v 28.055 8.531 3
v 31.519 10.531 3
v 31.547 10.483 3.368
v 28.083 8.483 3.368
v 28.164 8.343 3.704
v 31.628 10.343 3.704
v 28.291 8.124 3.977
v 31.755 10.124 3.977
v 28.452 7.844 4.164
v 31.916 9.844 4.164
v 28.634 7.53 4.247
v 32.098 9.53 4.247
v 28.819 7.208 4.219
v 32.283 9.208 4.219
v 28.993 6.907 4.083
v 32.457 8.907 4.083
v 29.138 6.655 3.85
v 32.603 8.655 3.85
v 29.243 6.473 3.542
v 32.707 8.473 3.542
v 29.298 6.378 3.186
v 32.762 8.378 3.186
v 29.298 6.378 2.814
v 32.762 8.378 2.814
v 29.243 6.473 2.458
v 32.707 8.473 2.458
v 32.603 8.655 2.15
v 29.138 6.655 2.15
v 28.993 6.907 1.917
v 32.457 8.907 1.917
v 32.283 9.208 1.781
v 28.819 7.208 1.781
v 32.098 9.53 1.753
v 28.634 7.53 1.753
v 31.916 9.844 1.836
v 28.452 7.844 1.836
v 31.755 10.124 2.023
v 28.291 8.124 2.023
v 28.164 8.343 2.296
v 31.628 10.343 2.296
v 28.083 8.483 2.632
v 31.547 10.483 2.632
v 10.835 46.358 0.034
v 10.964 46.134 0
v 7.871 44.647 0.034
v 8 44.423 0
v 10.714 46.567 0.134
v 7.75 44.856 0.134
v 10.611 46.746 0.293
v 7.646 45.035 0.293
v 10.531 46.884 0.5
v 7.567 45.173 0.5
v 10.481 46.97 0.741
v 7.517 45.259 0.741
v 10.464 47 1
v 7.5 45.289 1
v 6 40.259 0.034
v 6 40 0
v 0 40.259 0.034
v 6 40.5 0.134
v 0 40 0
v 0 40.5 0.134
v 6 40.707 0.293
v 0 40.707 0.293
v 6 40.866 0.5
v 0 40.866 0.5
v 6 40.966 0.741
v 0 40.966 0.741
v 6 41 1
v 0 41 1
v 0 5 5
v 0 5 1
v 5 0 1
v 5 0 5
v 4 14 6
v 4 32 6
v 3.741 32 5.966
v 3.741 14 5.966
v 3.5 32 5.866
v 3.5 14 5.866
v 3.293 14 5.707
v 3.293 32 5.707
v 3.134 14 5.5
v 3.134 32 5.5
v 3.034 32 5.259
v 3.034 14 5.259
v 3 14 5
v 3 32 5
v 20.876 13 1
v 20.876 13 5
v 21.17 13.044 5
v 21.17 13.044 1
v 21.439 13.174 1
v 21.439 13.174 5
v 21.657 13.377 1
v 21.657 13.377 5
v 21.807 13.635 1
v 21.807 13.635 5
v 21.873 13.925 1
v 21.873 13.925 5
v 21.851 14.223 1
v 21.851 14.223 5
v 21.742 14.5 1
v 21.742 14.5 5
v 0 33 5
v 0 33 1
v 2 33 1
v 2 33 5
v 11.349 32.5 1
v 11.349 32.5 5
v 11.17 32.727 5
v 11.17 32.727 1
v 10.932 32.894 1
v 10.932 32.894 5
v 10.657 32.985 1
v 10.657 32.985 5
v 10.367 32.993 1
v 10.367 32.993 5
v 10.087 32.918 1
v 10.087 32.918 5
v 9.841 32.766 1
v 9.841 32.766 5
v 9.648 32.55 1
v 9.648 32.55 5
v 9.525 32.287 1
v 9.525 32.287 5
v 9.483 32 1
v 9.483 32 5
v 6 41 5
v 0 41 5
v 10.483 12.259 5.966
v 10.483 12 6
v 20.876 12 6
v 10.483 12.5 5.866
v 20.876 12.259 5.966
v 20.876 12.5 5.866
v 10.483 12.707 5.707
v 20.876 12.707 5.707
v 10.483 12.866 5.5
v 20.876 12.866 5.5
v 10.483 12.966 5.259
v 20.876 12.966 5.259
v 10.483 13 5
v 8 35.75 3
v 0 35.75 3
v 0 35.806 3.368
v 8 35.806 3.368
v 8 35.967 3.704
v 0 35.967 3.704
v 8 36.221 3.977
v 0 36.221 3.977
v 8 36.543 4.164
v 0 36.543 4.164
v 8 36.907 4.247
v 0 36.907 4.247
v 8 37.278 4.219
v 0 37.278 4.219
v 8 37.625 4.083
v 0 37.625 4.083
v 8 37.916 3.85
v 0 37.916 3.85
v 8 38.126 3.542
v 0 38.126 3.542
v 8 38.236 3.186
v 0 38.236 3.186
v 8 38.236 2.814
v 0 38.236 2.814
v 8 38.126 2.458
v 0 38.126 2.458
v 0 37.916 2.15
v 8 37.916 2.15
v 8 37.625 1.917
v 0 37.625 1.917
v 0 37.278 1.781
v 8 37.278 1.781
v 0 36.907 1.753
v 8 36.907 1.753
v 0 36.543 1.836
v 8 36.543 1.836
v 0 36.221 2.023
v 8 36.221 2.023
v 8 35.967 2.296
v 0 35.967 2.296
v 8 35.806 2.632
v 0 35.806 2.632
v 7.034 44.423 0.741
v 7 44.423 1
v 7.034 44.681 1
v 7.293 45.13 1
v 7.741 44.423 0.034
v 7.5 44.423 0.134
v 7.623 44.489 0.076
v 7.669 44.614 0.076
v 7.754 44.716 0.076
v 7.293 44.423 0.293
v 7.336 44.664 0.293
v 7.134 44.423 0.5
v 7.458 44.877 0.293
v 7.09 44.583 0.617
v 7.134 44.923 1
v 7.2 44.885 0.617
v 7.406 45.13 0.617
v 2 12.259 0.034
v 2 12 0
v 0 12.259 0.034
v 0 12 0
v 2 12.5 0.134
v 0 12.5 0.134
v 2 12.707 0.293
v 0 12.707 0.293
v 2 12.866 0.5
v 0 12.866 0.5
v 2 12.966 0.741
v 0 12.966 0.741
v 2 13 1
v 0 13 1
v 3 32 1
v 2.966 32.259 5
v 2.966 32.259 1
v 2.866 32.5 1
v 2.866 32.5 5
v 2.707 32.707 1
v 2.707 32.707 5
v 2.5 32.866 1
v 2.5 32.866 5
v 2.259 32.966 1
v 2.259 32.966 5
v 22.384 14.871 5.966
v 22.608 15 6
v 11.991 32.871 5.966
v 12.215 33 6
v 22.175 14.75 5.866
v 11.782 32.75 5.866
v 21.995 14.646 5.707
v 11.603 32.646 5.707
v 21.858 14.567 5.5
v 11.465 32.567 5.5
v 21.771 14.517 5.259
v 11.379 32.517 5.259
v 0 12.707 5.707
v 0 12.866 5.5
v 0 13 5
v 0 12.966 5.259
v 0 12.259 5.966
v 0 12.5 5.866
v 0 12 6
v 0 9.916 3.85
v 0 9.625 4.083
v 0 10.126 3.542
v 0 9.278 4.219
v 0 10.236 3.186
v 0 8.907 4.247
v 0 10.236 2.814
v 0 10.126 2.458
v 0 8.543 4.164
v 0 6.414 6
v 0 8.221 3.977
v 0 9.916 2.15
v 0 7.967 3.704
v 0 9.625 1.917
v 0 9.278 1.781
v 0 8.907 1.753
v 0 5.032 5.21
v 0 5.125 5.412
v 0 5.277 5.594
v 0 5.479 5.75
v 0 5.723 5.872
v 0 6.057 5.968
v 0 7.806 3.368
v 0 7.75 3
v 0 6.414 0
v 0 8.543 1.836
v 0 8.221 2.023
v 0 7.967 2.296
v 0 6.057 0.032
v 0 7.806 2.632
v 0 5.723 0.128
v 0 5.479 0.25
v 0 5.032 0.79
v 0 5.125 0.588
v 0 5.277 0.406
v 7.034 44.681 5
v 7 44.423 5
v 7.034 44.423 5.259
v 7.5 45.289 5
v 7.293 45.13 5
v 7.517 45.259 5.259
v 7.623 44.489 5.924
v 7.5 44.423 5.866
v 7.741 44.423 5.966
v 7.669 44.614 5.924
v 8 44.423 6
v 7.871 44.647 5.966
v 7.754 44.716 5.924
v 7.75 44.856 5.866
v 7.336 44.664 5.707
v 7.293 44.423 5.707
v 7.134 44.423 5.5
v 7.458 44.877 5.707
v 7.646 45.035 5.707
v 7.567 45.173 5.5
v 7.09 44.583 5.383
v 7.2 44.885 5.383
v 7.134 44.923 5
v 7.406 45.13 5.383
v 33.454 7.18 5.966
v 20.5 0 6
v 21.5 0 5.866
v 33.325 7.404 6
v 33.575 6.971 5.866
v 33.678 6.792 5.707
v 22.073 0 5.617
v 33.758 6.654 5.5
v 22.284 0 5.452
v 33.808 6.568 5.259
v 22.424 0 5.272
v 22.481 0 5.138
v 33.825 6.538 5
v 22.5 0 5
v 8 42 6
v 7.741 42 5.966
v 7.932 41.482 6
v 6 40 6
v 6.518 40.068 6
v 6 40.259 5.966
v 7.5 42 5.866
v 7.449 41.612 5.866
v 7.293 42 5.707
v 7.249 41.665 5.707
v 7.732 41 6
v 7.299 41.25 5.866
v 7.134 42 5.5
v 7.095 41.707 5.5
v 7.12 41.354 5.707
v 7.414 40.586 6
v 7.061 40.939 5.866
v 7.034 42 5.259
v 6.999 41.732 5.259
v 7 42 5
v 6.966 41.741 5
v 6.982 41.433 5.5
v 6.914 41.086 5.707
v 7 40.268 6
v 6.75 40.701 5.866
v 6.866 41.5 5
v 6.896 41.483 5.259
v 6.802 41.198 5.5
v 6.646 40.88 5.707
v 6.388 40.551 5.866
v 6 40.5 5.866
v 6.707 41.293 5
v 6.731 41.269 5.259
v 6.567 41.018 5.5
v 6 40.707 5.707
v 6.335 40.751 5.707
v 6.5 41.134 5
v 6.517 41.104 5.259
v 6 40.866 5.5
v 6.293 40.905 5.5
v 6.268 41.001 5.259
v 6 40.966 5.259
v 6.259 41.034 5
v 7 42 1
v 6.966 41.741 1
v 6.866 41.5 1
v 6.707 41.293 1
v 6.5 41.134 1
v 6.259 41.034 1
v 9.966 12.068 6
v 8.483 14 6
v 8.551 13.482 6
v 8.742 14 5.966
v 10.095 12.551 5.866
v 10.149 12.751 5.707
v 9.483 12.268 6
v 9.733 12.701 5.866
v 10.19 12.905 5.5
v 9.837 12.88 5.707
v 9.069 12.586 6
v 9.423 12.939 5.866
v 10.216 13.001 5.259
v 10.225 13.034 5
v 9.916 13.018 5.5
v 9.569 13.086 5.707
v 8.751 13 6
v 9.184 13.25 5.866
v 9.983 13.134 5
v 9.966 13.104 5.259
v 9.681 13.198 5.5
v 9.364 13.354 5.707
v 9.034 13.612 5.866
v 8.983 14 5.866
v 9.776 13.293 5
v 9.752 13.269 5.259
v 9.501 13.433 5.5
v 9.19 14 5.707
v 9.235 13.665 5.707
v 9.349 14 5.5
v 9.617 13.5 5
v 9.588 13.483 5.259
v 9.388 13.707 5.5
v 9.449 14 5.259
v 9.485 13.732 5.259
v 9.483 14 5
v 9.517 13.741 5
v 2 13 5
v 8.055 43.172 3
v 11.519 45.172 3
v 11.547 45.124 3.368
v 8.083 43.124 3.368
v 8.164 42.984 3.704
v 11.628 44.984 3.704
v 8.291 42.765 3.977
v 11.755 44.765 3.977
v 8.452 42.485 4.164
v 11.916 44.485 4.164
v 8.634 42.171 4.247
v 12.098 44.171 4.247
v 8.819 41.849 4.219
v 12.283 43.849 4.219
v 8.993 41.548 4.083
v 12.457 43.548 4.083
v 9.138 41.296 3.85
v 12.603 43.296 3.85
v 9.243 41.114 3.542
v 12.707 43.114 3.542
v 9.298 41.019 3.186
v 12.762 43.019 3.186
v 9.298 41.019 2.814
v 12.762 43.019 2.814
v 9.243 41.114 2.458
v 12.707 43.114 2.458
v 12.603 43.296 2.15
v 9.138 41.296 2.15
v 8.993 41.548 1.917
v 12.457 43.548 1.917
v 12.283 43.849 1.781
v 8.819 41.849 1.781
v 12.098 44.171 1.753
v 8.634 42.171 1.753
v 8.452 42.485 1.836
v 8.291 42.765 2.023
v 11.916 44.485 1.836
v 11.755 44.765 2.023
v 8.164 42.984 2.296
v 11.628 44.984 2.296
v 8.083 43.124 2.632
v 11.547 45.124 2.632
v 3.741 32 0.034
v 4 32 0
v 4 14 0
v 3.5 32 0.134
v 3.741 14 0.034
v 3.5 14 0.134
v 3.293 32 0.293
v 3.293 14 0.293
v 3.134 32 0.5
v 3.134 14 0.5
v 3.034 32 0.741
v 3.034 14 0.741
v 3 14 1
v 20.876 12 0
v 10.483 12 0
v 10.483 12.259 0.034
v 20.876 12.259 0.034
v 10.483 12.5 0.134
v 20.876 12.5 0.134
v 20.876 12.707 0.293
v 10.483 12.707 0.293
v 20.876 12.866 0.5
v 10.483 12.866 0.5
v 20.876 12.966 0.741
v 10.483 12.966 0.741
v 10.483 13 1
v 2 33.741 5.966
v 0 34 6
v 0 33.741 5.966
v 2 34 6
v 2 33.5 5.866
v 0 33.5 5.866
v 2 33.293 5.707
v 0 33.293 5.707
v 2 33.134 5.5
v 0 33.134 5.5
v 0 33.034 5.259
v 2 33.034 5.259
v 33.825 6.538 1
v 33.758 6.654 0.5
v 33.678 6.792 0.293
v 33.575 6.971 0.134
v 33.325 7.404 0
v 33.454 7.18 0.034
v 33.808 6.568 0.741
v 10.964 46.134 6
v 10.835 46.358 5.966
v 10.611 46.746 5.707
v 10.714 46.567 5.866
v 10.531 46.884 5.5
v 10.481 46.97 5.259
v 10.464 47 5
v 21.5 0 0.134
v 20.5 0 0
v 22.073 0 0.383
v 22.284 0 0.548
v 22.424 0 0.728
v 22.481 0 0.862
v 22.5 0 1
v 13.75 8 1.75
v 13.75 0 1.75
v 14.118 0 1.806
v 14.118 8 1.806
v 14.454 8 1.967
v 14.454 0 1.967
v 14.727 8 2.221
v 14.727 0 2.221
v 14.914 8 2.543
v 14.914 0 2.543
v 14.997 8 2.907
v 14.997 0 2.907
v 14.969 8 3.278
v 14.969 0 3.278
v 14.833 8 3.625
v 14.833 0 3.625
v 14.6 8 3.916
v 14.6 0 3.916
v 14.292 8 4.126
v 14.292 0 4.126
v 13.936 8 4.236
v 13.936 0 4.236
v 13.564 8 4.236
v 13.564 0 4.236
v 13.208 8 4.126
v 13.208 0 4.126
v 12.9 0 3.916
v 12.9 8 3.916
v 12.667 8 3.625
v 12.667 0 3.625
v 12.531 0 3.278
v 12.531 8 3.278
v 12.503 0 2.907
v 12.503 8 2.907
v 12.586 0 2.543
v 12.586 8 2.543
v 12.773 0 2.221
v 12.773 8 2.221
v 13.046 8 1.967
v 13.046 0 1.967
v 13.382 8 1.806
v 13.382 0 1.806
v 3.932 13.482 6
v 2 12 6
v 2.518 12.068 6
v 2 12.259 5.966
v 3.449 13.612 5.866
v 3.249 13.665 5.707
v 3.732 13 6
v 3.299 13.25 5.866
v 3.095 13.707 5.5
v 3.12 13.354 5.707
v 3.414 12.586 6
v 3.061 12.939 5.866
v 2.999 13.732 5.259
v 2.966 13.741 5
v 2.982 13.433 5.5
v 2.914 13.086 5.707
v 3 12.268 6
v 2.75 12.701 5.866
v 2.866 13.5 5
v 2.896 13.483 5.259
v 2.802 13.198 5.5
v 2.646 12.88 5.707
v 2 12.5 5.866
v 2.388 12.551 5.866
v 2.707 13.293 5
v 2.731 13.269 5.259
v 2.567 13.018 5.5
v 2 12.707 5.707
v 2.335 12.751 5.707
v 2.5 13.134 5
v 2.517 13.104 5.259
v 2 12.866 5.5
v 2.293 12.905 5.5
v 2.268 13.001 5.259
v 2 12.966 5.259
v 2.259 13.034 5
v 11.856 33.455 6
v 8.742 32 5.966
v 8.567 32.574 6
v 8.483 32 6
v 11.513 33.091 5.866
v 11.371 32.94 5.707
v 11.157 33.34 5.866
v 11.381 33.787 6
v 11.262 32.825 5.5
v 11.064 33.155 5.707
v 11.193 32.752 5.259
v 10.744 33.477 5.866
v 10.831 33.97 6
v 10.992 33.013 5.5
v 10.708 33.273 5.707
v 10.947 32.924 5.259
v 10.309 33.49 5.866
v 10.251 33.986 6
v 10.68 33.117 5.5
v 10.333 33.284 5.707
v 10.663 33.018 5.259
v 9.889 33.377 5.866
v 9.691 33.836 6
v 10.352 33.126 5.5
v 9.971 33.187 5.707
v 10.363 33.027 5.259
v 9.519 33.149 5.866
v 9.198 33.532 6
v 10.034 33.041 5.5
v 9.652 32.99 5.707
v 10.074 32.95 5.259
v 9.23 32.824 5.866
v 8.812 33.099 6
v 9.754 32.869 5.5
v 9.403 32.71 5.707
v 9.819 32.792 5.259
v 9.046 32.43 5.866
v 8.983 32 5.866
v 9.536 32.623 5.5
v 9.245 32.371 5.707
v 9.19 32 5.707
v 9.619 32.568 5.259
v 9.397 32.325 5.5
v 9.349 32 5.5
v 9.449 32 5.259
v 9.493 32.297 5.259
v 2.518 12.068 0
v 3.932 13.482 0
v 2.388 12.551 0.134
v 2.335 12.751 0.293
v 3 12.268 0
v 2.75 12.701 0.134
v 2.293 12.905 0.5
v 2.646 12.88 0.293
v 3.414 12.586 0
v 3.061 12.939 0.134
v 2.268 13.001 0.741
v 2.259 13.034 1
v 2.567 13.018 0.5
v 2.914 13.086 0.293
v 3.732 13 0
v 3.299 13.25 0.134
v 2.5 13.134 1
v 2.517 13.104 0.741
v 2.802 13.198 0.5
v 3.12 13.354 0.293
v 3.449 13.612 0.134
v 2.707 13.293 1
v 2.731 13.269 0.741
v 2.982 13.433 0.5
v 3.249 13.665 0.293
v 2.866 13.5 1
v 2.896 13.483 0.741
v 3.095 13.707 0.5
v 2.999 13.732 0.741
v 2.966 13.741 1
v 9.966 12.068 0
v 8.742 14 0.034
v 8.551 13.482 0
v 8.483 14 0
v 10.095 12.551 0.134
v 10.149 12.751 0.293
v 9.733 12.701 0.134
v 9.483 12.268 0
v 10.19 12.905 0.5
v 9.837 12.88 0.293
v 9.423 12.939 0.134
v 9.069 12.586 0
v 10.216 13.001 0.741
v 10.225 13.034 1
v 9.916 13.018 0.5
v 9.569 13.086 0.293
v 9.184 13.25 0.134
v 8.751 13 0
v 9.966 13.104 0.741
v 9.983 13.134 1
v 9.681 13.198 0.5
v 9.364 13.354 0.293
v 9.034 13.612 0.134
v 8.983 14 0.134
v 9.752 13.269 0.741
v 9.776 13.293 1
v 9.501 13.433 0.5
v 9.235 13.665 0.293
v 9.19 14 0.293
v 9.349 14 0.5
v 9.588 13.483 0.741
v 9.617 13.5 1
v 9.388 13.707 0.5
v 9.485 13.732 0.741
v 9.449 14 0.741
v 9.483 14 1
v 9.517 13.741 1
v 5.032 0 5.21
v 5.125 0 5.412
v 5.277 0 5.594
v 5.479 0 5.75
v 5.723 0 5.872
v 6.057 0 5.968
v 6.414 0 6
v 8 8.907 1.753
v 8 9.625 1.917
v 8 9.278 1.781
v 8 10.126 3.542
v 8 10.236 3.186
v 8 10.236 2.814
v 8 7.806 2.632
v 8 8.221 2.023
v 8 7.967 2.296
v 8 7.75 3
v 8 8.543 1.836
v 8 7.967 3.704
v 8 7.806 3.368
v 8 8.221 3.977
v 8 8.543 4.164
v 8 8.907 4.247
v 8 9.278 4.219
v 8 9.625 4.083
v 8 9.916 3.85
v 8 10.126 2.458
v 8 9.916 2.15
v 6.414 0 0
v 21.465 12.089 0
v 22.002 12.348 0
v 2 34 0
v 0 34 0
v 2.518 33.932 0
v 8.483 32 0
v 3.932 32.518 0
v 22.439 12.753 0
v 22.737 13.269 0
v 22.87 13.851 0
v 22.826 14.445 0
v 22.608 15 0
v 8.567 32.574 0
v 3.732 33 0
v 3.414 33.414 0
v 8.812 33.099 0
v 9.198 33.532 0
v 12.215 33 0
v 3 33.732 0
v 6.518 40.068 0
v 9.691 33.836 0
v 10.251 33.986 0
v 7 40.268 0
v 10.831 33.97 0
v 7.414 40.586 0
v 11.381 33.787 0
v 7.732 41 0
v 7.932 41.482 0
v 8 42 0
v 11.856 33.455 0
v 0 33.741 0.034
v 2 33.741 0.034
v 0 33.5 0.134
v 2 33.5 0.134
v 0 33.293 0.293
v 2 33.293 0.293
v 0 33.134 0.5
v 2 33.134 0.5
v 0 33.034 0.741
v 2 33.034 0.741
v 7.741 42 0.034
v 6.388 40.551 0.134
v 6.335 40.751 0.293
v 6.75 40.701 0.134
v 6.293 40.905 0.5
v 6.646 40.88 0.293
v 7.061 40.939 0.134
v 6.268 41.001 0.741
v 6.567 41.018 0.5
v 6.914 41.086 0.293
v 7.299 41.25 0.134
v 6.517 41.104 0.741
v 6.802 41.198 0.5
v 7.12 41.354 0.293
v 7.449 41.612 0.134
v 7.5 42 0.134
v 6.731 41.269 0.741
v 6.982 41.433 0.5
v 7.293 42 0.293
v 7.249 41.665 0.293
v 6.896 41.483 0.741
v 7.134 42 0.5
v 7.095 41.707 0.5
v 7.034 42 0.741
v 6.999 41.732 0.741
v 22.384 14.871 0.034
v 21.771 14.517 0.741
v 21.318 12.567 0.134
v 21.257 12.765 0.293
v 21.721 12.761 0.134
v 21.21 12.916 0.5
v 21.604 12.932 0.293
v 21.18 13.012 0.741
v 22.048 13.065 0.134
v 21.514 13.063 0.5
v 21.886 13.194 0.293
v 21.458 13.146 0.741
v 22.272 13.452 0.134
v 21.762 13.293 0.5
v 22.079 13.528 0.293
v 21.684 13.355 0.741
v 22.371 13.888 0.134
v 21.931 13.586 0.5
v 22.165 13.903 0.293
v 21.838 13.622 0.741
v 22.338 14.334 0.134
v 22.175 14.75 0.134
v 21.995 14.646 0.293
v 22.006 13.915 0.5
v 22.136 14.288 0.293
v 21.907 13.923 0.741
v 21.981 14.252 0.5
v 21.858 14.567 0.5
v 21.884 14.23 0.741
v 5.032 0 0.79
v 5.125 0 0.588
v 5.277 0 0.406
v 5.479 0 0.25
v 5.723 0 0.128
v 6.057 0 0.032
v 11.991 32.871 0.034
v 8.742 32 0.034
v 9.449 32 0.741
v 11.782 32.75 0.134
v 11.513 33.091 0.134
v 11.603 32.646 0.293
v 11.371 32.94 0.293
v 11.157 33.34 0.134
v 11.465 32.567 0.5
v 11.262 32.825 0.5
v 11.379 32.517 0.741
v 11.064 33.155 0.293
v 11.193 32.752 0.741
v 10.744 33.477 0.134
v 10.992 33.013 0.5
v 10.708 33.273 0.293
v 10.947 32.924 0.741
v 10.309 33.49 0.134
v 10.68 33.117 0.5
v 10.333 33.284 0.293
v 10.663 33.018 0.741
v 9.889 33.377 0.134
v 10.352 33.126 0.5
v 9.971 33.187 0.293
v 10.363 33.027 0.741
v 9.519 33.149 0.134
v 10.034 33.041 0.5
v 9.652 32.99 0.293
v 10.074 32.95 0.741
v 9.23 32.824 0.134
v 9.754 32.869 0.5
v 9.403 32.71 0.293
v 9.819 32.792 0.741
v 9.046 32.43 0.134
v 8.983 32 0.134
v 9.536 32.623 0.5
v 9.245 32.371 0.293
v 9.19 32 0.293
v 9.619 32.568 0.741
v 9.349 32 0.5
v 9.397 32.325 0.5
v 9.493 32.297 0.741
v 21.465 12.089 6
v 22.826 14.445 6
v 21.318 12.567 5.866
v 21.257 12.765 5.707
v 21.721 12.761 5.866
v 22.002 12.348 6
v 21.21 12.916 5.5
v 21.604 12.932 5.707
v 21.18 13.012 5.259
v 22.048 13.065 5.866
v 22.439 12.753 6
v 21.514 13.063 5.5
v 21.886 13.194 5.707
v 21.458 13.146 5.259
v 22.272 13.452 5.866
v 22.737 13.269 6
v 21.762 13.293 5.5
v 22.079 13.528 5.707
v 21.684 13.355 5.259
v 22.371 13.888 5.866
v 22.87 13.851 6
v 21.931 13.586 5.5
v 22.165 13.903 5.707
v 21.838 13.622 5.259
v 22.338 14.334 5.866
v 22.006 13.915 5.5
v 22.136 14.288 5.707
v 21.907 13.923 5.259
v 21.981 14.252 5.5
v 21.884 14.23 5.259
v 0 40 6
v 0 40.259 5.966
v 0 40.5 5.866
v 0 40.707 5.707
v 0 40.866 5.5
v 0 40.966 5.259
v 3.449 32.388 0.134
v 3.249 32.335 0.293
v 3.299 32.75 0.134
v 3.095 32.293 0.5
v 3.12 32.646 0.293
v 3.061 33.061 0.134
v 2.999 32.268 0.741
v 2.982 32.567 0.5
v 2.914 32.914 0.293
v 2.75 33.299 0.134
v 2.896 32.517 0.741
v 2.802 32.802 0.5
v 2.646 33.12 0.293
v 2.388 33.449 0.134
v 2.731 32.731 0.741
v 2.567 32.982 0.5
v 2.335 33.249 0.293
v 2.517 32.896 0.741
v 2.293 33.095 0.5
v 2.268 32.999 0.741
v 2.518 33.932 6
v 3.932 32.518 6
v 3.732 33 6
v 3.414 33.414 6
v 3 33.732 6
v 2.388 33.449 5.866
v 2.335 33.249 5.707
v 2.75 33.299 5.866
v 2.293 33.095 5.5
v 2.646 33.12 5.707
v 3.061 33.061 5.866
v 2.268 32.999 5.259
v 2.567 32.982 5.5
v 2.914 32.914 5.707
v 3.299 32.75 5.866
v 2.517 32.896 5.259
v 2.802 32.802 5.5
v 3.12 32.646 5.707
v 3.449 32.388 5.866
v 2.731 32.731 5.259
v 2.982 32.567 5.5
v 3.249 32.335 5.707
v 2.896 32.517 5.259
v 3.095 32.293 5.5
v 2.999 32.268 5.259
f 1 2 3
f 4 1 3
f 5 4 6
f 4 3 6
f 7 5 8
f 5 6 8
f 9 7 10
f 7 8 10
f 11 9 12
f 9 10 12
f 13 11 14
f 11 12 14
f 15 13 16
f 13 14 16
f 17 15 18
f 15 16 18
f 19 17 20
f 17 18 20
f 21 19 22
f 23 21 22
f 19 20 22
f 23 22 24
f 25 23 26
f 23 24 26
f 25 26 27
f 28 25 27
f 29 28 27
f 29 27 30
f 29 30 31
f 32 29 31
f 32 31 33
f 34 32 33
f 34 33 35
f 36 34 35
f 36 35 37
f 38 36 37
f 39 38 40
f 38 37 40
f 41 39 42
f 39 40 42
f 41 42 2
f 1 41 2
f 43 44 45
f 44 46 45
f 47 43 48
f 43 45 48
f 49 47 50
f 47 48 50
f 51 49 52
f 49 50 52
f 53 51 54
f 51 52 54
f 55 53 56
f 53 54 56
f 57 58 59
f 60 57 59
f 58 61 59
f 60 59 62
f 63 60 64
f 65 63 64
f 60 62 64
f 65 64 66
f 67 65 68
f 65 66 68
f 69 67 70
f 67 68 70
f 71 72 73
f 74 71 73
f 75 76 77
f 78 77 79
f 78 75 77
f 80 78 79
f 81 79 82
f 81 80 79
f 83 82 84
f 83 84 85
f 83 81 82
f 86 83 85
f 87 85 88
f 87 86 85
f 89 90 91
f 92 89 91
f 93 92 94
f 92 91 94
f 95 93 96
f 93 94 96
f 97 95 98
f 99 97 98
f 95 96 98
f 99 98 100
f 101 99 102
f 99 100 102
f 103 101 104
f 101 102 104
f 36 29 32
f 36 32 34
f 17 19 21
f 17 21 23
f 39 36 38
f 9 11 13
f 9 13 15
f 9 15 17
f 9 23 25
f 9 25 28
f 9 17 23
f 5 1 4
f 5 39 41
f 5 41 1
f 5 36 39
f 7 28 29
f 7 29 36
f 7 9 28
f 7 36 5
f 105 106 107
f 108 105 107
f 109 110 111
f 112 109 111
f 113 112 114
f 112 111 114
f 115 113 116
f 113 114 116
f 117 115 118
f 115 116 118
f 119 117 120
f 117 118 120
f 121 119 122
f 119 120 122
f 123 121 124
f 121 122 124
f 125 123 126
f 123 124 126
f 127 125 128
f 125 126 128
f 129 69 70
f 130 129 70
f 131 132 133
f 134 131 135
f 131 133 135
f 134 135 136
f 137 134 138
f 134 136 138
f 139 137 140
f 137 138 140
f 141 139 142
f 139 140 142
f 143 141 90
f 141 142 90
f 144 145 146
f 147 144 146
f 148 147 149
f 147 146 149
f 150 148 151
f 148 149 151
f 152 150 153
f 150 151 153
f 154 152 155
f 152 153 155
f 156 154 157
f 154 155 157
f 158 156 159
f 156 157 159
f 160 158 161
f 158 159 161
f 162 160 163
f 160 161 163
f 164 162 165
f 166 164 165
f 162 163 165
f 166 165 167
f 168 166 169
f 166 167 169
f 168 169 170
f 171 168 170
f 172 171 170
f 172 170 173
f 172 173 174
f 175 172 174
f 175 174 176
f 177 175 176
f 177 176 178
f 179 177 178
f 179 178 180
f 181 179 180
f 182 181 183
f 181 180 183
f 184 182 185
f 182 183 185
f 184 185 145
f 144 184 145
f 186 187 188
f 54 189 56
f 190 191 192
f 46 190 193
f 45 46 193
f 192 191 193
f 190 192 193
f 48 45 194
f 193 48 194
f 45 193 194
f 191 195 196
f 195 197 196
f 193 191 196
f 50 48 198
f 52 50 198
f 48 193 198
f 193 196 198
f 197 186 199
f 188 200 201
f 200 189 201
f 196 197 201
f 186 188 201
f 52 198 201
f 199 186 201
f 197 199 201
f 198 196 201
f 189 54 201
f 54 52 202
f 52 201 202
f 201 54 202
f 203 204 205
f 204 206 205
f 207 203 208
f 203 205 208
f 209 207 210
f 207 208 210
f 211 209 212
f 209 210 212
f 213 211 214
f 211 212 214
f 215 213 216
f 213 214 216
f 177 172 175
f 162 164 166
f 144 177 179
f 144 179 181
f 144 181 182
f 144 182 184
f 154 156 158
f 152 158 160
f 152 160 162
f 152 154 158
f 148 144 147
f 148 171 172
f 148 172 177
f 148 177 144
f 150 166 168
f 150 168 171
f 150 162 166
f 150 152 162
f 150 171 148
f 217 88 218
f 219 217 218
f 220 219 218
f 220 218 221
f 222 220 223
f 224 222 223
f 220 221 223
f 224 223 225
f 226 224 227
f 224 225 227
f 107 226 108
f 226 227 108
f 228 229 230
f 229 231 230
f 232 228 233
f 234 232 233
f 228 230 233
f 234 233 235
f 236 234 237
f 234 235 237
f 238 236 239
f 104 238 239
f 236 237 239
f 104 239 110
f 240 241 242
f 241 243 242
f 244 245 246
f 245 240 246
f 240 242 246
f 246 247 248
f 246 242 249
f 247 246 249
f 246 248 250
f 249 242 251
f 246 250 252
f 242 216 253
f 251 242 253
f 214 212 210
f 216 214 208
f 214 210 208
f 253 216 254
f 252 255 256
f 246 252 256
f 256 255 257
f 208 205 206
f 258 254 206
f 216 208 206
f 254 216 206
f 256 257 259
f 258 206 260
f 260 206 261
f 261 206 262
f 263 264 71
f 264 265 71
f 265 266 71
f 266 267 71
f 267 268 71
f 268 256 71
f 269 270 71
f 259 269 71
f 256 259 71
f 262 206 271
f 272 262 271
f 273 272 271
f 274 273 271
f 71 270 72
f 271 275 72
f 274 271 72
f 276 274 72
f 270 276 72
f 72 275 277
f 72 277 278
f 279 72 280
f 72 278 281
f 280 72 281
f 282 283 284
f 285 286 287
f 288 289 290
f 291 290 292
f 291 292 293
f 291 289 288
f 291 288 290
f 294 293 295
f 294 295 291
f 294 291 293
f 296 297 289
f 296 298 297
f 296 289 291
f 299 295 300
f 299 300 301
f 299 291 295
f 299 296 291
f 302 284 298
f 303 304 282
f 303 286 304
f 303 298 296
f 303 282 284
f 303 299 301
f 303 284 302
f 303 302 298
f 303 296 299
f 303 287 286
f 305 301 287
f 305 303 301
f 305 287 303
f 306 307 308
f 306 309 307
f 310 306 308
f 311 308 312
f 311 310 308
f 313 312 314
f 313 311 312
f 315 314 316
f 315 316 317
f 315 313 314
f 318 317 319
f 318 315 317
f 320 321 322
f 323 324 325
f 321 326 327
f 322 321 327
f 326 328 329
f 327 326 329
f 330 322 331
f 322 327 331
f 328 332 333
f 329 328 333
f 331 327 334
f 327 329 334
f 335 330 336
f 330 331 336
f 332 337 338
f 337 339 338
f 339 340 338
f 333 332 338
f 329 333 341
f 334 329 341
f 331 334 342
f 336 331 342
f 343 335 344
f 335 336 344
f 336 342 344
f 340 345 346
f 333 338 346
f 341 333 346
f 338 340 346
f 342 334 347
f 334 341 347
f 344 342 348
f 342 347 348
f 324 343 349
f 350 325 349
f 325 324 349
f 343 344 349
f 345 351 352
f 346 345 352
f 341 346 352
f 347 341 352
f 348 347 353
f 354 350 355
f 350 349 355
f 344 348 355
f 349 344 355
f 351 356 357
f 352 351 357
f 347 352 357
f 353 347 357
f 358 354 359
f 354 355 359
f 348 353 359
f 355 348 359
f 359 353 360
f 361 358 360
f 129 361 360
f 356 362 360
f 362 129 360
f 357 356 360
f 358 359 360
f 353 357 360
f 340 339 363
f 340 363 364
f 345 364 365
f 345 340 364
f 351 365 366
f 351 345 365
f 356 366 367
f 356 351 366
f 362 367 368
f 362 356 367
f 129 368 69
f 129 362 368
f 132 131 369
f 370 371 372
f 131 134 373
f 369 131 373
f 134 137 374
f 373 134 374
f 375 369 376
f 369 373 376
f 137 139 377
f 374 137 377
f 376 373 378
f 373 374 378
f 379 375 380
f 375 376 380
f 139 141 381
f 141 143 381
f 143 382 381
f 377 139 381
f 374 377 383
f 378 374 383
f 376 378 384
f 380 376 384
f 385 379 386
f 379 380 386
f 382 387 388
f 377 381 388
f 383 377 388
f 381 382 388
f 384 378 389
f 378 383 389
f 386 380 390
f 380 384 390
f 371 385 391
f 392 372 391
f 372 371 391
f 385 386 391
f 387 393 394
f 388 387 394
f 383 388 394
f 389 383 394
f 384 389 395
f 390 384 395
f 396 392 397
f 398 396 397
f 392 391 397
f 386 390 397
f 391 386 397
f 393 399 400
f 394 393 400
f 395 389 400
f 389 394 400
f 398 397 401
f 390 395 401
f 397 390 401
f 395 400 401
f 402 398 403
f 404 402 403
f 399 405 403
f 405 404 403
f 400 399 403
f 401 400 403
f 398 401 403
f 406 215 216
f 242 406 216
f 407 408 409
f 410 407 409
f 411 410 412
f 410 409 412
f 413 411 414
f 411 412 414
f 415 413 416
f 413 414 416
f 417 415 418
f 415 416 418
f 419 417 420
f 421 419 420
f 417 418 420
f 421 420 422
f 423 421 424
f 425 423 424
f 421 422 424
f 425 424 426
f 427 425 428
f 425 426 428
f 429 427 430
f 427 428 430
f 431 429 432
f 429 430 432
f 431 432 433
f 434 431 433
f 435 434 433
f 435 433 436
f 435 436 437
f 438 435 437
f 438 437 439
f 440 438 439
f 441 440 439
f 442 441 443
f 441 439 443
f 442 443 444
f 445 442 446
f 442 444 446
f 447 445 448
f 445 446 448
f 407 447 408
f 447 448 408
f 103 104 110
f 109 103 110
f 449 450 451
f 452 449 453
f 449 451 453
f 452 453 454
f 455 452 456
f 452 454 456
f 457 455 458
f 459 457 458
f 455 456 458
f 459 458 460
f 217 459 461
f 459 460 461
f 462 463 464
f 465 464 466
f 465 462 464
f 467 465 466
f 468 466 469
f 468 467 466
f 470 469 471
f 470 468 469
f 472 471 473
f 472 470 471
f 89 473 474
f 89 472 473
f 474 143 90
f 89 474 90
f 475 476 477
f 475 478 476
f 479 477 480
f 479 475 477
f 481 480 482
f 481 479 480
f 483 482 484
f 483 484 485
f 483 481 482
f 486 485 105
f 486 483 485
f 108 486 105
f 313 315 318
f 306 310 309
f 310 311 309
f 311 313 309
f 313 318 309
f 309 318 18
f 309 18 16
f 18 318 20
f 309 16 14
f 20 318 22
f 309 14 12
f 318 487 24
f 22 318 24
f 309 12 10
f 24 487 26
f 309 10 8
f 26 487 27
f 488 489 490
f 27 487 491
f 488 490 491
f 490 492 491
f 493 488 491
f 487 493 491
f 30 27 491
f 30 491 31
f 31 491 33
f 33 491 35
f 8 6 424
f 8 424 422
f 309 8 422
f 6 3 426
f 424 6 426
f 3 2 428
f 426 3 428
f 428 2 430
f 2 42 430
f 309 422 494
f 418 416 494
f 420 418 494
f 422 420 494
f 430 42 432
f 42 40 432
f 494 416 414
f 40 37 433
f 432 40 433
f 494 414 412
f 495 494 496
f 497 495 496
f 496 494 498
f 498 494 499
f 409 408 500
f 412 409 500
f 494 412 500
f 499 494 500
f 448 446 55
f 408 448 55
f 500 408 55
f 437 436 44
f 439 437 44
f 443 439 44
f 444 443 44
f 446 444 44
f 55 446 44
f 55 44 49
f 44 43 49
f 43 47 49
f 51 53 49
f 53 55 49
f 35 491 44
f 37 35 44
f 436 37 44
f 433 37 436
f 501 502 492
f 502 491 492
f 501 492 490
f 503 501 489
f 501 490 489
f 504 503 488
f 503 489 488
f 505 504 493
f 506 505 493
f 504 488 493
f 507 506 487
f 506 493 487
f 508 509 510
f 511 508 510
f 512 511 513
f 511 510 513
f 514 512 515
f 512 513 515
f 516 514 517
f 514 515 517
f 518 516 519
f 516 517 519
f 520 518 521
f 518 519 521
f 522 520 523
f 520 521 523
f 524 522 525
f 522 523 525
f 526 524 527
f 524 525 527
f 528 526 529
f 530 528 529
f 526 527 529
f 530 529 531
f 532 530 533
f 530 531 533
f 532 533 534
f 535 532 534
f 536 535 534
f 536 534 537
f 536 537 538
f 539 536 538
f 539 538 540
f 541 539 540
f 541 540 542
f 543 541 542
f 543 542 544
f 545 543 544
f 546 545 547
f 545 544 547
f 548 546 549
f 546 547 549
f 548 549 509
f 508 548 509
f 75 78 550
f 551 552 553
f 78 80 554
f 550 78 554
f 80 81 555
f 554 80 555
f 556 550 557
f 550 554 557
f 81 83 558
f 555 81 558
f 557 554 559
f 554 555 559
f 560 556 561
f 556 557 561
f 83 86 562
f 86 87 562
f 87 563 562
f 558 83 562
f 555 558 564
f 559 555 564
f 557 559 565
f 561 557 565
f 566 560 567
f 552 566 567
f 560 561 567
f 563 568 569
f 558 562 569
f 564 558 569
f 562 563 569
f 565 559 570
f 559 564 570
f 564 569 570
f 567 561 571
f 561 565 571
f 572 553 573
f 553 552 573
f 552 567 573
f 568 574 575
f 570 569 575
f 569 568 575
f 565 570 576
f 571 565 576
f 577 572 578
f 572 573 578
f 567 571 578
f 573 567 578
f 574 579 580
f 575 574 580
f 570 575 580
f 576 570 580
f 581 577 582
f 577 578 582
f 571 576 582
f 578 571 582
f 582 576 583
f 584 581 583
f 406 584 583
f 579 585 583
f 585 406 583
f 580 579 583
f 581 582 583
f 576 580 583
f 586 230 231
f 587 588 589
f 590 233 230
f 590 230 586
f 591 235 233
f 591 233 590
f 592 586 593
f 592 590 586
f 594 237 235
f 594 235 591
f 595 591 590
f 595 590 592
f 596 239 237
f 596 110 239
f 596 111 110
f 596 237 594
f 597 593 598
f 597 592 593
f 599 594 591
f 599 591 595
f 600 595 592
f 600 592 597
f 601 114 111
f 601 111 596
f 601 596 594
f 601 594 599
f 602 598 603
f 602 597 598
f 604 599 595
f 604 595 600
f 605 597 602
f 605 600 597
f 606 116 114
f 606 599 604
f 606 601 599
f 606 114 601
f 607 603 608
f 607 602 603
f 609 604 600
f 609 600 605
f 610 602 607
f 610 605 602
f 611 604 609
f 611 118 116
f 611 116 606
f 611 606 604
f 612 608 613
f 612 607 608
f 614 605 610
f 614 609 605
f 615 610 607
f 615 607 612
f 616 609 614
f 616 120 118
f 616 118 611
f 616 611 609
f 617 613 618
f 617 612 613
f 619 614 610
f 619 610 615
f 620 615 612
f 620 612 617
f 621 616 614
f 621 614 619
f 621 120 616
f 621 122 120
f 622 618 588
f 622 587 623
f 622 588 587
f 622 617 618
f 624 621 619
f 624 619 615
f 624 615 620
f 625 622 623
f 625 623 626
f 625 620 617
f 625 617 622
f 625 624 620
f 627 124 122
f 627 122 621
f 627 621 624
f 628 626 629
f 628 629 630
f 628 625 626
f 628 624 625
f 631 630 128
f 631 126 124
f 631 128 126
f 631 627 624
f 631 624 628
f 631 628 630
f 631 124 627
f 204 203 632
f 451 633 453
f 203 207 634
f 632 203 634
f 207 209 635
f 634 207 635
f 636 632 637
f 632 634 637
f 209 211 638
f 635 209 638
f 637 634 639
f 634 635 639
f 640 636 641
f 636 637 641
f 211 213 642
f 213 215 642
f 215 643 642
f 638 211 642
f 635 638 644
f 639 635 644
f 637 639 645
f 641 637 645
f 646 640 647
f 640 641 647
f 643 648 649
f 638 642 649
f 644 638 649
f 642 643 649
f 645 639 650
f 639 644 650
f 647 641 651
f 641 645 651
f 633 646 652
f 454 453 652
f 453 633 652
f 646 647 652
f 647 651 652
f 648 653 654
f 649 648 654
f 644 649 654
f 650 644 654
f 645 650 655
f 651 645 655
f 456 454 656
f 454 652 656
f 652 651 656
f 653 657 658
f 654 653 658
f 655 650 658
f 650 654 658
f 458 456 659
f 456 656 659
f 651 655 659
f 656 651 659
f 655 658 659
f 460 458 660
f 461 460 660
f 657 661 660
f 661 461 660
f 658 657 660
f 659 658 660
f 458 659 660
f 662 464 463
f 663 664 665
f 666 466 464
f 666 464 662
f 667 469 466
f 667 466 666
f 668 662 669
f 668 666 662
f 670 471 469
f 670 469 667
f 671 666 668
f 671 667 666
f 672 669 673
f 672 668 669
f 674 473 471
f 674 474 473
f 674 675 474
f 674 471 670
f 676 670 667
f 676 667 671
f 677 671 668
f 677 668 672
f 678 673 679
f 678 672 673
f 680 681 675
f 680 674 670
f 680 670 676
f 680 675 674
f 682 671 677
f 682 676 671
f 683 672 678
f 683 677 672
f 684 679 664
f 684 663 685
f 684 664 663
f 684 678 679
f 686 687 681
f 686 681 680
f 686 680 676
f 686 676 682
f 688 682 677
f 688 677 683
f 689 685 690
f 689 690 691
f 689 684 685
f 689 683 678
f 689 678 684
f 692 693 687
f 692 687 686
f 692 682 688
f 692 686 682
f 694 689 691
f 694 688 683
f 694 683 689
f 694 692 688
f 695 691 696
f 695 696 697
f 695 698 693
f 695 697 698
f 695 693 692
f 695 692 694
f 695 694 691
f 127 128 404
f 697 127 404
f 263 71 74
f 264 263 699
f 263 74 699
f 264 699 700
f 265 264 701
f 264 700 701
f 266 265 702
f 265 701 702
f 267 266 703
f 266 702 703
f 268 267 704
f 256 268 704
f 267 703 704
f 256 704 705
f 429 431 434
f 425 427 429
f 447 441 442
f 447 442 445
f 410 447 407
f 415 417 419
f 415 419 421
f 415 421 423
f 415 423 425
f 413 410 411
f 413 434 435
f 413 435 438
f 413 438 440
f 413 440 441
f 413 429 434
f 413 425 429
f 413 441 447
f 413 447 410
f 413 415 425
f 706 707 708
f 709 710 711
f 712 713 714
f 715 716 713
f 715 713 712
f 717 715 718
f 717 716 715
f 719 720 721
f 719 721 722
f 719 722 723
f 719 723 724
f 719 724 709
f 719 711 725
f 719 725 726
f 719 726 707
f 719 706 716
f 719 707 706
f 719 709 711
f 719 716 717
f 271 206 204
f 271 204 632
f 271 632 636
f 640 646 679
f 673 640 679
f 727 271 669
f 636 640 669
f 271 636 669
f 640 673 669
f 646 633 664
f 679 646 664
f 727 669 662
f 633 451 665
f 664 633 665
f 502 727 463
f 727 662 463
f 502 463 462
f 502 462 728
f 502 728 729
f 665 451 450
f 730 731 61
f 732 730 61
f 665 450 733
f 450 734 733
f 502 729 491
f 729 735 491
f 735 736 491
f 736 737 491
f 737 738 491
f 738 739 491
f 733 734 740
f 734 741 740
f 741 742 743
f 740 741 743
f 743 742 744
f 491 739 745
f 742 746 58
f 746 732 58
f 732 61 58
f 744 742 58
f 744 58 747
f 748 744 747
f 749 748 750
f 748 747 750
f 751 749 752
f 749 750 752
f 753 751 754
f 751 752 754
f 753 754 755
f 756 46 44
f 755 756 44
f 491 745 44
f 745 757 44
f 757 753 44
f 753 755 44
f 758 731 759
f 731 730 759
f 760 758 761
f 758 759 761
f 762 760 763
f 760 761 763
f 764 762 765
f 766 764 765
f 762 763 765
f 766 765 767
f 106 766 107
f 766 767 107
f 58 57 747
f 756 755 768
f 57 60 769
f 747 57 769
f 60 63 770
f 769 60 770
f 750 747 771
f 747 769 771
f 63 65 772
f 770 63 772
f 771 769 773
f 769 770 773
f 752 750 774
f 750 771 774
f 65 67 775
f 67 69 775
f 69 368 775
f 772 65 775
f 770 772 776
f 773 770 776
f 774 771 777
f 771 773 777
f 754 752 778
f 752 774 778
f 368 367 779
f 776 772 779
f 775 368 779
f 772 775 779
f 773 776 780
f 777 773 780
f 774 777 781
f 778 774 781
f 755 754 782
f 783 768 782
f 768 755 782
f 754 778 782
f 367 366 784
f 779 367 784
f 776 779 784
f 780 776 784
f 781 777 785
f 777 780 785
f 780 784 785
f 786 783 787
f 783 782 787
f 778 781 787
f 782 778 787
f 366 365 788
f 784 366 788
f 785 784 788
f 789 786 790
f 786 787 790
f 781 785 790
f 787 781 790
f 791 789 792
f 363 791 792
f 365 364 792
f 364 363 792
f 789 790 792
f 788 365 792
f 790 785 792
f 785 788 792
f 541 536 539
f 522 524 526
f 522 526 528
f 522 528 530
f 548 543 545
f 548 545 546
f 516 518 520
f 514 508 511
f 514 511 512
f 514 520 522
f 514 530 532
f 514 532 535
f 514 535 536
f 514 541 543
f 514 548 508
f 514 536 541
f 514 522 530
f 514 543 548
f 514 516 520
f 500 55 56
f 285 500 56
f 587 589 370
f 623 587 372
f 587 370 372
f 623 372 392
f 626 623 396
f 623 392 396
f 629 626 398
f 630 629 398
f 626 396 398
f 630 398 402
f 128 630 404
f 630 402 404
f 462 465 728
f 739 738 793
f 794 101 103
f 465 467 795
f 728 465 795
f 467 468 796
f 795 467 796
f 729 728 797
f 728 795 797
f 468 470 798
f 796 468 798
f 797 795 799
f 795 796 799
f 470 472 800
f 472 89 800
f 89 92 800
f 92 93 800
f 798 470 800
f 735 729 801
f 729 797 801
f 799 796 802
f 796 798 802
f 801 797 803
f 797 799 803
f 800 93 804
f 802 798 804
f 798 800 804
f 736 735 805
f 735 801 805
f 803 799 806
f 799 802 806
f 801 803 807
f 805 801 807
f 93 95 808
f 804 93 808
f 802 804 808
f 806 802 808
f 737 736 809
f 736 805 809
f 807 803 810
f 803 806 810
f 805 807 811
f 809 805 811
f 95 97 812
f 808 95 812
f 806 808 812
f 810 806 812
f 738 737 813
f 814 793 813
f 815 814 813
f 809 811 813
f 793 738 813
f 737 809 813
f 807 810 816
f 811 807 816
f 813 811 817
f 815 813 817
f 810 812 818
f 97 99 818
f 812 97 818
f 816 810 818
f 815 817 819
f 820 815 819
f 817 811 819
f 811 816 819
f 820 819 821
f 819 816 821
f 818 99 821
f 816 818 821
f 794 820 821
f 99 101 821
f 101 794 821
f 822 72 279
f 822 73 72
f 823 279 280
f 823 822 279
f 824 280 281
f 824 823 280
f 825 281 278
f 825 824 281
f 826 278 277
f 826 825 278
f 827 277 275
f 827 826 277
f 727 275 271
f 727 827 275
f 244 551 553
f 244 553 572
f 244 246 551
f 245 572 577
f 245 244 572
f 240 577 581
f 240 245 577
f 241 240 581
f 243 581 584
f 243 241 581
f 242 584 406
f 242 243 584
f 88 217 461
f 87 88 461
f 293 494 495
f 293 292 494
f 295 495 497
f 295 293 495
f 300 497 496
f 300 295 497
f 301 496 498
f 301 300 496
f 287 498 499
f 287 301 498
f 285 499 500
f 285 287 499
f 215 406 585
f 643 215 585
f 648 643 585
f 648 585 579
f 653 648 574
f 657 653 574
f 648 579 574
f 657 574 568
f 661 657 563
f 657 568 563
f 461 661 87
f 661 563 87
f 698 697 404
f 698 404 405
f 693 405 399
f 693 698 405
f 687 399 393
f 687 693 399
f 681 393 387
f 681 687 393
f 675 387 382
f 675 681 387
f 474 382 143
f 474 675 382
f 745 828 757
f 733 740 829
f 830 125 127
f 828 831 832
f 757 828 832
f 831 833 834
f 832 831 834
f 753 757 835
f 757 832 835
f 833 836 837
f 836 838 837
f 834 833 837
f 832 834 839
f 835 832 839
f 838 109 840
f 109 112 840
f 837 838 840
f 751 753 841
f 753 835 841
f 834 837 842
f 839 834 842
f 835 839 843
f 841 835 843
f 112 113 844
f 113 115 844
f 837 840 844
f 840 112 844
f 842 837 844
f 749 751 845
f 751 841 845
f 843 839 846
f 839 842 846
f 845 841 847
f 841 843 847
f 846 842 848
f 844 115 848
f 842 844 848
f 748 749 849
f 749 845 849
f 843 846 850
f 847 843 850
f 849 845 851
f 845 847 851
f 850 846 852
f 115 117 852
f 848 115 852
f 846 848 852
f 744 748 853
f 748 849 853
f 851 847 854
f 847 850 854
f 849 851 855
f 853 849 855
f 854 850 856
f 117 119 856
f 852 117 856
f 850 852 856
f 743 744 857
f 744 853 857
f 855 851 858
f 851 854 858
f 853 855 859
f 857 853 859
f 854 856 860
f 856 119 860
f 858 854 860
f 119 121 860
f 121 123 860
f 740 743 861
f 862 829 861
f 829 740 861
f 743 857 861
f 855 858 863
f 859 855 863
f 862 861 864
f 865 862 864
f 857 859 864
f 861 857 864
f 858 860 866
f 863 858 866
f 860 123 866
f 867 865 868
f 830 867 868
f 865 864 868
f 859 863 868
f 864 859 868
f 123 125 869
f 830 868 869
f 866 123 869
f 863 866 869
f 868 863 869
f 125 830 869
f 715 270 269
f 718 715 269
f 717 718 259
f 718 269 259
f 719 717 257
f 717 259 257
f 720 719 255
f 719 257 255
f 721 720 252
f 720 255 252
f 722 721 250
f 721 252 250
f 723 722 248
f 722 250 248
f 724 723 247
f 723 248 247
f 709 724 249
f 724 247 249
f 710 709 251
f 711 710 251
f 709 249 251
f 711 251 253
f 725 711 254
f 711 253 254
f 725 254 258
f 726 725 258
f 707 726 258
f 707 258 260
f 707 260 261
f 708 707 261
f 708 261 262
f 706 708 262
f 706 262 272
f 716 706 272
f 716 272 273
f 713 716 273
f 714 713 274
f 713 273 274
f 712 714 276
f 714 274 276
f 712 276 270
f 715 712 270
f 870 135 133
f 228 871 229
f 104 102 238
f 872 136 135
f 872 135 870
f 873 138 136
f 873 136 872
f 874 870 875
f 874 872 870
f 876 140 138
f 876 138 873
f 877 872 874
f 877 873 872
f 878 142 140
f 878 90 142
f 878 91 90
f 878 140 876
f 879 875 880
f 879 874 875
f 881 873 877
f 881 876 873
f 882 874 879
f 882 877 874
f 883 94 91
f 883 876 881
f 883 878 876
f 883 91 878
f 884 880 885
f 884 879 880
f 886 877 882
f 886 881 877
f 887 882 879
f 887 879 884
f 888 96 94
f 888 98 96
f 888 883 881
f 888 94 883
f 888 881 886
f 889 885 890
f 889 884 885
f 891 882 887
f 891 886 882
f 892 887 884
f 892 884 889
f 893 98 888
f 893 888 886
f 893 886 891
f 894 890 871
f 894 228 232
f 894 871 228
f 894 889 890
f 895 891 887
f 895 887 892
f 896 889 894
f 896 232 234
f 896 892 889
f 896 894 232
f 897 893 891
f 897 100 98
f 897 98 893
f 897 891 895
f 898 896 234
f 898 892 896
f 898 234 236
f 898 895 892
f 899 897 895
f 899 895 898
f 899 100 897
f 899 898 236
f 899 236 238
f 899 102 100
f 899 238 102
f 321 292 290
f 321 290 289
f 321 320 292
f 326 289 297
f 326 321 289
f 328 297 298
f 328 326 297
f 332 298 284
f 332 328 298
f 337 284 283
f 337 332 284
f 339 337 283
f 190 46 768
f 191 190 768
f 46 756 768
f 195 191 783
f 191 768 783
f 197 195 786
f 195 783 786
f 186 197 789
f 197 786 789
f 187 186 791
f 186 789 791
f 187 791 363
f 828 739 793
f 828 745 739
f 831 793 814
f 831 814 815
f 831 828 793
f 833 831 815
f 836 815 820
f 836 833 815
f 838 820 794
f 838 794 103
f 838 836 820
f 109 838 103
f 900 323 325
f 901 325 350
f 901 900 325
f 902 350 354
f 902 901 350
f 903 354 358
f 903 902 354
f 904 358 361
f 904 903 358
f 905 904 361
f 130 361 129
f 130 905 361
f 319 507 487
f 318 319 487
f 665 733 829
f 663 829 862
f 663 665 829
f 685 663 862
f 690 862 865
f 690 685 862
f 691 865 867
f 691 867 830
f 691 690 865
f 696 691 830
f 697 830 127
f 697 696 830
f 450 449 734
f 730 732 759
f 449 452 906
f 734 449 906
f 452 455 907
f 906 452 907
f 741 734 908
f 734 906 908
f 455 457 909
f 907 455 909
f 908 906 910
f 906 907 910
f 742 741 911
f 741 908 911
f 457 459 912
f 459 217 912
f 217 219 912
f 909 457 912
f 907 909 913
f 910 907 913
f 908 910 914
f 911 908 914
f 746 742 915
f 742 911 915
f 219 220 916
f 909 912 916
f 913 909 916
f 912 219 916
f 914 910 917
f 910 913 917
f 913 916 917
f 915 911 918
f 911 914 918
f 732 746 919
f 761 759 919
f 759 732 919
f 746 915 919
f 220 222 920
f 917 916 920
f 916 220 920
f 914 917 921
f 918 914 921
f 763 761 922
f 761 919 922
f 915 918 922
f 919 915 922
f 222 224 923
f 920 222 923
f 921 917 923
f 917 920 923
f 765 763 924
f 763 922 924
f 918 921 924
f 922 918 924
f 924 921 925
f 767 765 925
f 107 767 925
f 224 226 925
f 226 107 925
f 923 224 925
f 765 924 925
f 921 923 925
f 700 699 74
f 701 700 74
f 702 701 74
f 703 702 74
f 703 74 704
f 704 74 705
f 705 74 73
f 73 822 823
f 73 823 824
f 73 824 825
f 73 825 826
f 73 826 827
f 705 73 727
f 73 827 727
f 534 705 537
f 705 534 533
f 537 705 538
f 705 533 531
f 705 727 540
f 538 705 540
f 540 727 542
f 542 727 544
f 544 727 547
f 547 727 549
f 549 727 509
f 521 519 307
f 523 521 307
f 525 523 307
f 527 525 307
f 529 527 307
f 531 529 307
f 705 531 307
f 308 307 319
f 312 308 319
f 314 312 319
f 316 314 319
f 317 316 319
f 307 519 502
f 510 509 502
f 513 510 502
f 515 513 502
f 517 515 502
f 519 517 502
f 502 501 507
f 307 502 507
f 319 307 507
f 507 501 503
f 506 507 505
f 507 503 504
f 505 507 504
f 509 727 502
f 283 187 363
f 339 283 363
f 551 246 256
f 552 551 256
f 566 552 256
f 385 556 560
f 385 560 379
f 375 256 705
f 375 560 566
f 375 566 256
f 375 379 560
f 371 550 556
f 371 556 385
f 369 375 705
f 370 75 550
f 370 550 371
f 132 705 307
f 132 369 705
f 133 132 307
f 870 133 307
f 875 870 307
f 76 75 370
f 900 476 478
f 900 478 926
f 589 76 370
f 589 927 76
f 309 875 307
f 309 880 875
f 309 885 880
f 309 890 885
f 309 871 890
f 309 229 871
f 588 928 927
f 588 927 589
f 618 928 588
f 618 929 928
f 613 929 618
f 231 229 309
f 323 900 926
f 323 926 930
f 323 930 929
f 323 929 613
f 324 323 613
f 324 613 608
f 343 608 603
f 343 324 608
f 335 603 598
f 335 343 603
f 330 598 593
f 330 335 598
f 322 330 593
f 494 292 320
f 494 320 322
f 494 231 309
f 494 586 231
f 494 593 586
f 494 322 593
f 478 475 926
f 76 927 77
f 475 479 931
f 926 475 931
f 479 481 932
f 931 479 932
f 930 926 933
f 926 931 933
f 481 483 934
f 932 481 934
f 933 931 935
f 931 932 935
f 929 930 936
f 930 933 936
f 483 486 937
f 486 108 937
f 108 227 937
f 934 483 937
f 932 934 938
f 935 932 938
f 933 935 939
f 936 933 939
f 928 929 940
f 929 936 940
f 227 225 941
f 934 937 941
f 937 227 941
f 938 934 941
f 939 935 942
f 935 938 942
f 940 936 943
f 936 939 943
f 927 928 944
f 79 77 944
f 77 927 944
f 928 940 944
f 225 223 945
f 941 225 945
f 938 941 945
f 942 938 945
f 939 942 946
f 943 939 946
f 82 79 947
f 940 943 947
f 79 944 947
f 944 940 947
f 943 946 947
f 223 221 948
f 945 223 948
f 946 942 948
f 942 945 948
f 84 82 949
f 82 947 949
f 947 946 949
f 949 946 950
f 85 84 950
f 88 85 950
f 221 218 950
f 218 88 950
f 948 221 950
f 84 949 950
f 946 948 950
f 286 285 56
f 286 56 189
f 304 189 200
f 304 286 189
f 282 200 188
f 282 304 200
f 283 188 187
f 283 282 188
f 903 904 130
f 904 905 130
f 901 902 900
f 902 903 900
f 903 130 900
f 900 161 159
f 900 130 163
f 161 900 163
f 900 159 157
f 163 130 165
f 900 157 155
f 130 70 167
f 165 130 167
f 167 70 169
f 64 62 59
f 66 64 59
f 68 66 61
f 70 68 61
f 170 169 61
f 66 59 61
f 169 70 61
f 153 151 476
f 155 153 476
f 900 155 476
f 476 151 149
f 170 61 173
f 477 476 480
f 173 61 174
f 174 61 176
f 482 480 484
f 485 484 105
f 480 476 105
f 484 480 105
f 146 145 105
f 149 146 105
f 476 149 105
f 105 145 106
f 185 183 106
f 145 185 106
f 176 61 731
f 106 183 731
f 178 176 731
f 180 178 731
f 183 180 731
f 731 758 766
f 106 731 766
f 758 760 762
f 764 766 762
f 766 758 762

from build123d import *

# Parameters (mm, degrees)
EXTRUDE_1_DEPTH     = 6
CUT_EXTRUDE_1_DEPTH = 6
SKETCH_3_R          = 1.25
CUT_EXTRUDE_2_DEPTH = 8
SKETCH_4_R          = 1.25
CUT_EXTRUDE_3_DEPTH = 8
SKETCH_5_R          = 1.25
CUT_EXTRUDE_4_DEPTH = 4
FILLET_2_R          = 1


with BuildPart() as part:
    # Эскиз1 → Бобышка-Вытянуть1 (new body)
    with BuildSketch(Plane.XY):
        Polygon((0, 5), (5, 0), (22.5, 0), (33.8246732, 6.538303121), (10.464101615, 47), (7, 45), (7, 41), (0, 41), (0, 33), (3, 33), (3, 13), (0, 13), align=None)
    extrude(amount=EXTRUDE_1_DEPTH)

    # Эскиз2 → Вырез-Вытянуть1 (cut)
    with BuildSketch(Plane.XY.offset(6)):
        with BuildLine():
            Line((9.483339502, 32), (9.483339502, 13))
            Line((9.483339502, 13), (20.875644347, 13))
            ThreePointArc((20.875644347, 13), (21.741669751, 13.5), (21.741669751, 14.5))
            Line((21.741669751, 14.5), (11.349364905, 32.5))
            ThreePointArc((11.349364905, 32.5), (10.224520457, 32.965925826), (9.483339502, 32))
        make_face()
    extrude(amount=-CUT_EXTRUDE_1_DEPTH, mode=Mode.SUBTRACT)

    # Эскиз3 → Вырез-Вытянуть2 (cut)
    with BuildSketch(Plane.ZY):
        with Locations(Location((3, 37, 0), (0, 0, 270))):
            Circle(SKETCH_3_R)
        with Locations(Location((3, 9, 0), (0, 0, 270))):
            Circle(SKETCH_3_R)
    extrude(amount=-CUT_EXTRUDE_2_DEPTH, mode=Mode.SUBTRACT)

    # Эскиз4 → Вырез-Вытянуть3 (cut)
    with BuildSketch(Plane.XZ):
        with Locations(Location((13.75, 3, 0), (0, 0, 270))):
            Circle(SKETCH_4_R)
    extrude(amount=-CUT_EXTRUDE_3_DEPTH, mode=Mode.SUBTRACT)

    # Эскиз5 → Вырез-Вытянуть4 (cut)
    with BuildSketch(Plane(origin=(28.1996732, 16.281088913, 0), x_dir=(0, 0, -1), z_dir=(0.8660254037844379, 0.5000000000000014, 0))):
        with Locations(Location((-3, 32.110571585, 0), (0, 0, 90))):
            Circle(SKETCH_5_R)
        with Locations(Location((-3, -7.889428415, 0), (0, 0, 90))):
            Circle(SKETCH_5_R)
    extrude(amount=-CUT_EXTRUDE_4_DEPTH, mode=Mode.SUBTRACT)

    # Скругление2
    fillet_2_edges = [part.edges().sort_by_distance(p)[0] for p in [
        (1.5, 13, 0),
        (3, 23, 0),
        (1.5, 33, 0),
        (3.5, 41, 0),
        (7, 43, 0),
        (28.1623366, 3.26915156, 6),
        (8.732050808, 46, 0),
        (28.1623366, 3.26915156, 0),
        (2.5, 2.5, 0),
        (8.732050808, 46, 6),
        (3, 13, 3),
        (3, 33, 3),
        (7, 41, 3),
        (7, 45, 3),
        (7, 43, 6),
        (3.5, 41, 6),
        (1.5, 33, 6),
        (3, 23, 6),
        (1.5, 13, 6),
        (15.179491924, 13, 0),
        (9.483339502, 22.5, 0),
        (9.483339502, 13, 3),
        (10.224520457, 32.965925826, 0),
        (16.545517328, 23.5, 0),
        (21.741669751, 13.5, 0),
        (15.179491924, 13, 6),
        (21.741669751, 13.5, 6),
        (16.545517328, 23.5, 6),
        (10.224520457, 32.965925826, 6),
        (9.483339502, 22.5, 6),
        (2.5, 2.5, 6),
    ]]
    fillet(fillet_2_edges, radius=FILLET_2_R)


solid = part.part
